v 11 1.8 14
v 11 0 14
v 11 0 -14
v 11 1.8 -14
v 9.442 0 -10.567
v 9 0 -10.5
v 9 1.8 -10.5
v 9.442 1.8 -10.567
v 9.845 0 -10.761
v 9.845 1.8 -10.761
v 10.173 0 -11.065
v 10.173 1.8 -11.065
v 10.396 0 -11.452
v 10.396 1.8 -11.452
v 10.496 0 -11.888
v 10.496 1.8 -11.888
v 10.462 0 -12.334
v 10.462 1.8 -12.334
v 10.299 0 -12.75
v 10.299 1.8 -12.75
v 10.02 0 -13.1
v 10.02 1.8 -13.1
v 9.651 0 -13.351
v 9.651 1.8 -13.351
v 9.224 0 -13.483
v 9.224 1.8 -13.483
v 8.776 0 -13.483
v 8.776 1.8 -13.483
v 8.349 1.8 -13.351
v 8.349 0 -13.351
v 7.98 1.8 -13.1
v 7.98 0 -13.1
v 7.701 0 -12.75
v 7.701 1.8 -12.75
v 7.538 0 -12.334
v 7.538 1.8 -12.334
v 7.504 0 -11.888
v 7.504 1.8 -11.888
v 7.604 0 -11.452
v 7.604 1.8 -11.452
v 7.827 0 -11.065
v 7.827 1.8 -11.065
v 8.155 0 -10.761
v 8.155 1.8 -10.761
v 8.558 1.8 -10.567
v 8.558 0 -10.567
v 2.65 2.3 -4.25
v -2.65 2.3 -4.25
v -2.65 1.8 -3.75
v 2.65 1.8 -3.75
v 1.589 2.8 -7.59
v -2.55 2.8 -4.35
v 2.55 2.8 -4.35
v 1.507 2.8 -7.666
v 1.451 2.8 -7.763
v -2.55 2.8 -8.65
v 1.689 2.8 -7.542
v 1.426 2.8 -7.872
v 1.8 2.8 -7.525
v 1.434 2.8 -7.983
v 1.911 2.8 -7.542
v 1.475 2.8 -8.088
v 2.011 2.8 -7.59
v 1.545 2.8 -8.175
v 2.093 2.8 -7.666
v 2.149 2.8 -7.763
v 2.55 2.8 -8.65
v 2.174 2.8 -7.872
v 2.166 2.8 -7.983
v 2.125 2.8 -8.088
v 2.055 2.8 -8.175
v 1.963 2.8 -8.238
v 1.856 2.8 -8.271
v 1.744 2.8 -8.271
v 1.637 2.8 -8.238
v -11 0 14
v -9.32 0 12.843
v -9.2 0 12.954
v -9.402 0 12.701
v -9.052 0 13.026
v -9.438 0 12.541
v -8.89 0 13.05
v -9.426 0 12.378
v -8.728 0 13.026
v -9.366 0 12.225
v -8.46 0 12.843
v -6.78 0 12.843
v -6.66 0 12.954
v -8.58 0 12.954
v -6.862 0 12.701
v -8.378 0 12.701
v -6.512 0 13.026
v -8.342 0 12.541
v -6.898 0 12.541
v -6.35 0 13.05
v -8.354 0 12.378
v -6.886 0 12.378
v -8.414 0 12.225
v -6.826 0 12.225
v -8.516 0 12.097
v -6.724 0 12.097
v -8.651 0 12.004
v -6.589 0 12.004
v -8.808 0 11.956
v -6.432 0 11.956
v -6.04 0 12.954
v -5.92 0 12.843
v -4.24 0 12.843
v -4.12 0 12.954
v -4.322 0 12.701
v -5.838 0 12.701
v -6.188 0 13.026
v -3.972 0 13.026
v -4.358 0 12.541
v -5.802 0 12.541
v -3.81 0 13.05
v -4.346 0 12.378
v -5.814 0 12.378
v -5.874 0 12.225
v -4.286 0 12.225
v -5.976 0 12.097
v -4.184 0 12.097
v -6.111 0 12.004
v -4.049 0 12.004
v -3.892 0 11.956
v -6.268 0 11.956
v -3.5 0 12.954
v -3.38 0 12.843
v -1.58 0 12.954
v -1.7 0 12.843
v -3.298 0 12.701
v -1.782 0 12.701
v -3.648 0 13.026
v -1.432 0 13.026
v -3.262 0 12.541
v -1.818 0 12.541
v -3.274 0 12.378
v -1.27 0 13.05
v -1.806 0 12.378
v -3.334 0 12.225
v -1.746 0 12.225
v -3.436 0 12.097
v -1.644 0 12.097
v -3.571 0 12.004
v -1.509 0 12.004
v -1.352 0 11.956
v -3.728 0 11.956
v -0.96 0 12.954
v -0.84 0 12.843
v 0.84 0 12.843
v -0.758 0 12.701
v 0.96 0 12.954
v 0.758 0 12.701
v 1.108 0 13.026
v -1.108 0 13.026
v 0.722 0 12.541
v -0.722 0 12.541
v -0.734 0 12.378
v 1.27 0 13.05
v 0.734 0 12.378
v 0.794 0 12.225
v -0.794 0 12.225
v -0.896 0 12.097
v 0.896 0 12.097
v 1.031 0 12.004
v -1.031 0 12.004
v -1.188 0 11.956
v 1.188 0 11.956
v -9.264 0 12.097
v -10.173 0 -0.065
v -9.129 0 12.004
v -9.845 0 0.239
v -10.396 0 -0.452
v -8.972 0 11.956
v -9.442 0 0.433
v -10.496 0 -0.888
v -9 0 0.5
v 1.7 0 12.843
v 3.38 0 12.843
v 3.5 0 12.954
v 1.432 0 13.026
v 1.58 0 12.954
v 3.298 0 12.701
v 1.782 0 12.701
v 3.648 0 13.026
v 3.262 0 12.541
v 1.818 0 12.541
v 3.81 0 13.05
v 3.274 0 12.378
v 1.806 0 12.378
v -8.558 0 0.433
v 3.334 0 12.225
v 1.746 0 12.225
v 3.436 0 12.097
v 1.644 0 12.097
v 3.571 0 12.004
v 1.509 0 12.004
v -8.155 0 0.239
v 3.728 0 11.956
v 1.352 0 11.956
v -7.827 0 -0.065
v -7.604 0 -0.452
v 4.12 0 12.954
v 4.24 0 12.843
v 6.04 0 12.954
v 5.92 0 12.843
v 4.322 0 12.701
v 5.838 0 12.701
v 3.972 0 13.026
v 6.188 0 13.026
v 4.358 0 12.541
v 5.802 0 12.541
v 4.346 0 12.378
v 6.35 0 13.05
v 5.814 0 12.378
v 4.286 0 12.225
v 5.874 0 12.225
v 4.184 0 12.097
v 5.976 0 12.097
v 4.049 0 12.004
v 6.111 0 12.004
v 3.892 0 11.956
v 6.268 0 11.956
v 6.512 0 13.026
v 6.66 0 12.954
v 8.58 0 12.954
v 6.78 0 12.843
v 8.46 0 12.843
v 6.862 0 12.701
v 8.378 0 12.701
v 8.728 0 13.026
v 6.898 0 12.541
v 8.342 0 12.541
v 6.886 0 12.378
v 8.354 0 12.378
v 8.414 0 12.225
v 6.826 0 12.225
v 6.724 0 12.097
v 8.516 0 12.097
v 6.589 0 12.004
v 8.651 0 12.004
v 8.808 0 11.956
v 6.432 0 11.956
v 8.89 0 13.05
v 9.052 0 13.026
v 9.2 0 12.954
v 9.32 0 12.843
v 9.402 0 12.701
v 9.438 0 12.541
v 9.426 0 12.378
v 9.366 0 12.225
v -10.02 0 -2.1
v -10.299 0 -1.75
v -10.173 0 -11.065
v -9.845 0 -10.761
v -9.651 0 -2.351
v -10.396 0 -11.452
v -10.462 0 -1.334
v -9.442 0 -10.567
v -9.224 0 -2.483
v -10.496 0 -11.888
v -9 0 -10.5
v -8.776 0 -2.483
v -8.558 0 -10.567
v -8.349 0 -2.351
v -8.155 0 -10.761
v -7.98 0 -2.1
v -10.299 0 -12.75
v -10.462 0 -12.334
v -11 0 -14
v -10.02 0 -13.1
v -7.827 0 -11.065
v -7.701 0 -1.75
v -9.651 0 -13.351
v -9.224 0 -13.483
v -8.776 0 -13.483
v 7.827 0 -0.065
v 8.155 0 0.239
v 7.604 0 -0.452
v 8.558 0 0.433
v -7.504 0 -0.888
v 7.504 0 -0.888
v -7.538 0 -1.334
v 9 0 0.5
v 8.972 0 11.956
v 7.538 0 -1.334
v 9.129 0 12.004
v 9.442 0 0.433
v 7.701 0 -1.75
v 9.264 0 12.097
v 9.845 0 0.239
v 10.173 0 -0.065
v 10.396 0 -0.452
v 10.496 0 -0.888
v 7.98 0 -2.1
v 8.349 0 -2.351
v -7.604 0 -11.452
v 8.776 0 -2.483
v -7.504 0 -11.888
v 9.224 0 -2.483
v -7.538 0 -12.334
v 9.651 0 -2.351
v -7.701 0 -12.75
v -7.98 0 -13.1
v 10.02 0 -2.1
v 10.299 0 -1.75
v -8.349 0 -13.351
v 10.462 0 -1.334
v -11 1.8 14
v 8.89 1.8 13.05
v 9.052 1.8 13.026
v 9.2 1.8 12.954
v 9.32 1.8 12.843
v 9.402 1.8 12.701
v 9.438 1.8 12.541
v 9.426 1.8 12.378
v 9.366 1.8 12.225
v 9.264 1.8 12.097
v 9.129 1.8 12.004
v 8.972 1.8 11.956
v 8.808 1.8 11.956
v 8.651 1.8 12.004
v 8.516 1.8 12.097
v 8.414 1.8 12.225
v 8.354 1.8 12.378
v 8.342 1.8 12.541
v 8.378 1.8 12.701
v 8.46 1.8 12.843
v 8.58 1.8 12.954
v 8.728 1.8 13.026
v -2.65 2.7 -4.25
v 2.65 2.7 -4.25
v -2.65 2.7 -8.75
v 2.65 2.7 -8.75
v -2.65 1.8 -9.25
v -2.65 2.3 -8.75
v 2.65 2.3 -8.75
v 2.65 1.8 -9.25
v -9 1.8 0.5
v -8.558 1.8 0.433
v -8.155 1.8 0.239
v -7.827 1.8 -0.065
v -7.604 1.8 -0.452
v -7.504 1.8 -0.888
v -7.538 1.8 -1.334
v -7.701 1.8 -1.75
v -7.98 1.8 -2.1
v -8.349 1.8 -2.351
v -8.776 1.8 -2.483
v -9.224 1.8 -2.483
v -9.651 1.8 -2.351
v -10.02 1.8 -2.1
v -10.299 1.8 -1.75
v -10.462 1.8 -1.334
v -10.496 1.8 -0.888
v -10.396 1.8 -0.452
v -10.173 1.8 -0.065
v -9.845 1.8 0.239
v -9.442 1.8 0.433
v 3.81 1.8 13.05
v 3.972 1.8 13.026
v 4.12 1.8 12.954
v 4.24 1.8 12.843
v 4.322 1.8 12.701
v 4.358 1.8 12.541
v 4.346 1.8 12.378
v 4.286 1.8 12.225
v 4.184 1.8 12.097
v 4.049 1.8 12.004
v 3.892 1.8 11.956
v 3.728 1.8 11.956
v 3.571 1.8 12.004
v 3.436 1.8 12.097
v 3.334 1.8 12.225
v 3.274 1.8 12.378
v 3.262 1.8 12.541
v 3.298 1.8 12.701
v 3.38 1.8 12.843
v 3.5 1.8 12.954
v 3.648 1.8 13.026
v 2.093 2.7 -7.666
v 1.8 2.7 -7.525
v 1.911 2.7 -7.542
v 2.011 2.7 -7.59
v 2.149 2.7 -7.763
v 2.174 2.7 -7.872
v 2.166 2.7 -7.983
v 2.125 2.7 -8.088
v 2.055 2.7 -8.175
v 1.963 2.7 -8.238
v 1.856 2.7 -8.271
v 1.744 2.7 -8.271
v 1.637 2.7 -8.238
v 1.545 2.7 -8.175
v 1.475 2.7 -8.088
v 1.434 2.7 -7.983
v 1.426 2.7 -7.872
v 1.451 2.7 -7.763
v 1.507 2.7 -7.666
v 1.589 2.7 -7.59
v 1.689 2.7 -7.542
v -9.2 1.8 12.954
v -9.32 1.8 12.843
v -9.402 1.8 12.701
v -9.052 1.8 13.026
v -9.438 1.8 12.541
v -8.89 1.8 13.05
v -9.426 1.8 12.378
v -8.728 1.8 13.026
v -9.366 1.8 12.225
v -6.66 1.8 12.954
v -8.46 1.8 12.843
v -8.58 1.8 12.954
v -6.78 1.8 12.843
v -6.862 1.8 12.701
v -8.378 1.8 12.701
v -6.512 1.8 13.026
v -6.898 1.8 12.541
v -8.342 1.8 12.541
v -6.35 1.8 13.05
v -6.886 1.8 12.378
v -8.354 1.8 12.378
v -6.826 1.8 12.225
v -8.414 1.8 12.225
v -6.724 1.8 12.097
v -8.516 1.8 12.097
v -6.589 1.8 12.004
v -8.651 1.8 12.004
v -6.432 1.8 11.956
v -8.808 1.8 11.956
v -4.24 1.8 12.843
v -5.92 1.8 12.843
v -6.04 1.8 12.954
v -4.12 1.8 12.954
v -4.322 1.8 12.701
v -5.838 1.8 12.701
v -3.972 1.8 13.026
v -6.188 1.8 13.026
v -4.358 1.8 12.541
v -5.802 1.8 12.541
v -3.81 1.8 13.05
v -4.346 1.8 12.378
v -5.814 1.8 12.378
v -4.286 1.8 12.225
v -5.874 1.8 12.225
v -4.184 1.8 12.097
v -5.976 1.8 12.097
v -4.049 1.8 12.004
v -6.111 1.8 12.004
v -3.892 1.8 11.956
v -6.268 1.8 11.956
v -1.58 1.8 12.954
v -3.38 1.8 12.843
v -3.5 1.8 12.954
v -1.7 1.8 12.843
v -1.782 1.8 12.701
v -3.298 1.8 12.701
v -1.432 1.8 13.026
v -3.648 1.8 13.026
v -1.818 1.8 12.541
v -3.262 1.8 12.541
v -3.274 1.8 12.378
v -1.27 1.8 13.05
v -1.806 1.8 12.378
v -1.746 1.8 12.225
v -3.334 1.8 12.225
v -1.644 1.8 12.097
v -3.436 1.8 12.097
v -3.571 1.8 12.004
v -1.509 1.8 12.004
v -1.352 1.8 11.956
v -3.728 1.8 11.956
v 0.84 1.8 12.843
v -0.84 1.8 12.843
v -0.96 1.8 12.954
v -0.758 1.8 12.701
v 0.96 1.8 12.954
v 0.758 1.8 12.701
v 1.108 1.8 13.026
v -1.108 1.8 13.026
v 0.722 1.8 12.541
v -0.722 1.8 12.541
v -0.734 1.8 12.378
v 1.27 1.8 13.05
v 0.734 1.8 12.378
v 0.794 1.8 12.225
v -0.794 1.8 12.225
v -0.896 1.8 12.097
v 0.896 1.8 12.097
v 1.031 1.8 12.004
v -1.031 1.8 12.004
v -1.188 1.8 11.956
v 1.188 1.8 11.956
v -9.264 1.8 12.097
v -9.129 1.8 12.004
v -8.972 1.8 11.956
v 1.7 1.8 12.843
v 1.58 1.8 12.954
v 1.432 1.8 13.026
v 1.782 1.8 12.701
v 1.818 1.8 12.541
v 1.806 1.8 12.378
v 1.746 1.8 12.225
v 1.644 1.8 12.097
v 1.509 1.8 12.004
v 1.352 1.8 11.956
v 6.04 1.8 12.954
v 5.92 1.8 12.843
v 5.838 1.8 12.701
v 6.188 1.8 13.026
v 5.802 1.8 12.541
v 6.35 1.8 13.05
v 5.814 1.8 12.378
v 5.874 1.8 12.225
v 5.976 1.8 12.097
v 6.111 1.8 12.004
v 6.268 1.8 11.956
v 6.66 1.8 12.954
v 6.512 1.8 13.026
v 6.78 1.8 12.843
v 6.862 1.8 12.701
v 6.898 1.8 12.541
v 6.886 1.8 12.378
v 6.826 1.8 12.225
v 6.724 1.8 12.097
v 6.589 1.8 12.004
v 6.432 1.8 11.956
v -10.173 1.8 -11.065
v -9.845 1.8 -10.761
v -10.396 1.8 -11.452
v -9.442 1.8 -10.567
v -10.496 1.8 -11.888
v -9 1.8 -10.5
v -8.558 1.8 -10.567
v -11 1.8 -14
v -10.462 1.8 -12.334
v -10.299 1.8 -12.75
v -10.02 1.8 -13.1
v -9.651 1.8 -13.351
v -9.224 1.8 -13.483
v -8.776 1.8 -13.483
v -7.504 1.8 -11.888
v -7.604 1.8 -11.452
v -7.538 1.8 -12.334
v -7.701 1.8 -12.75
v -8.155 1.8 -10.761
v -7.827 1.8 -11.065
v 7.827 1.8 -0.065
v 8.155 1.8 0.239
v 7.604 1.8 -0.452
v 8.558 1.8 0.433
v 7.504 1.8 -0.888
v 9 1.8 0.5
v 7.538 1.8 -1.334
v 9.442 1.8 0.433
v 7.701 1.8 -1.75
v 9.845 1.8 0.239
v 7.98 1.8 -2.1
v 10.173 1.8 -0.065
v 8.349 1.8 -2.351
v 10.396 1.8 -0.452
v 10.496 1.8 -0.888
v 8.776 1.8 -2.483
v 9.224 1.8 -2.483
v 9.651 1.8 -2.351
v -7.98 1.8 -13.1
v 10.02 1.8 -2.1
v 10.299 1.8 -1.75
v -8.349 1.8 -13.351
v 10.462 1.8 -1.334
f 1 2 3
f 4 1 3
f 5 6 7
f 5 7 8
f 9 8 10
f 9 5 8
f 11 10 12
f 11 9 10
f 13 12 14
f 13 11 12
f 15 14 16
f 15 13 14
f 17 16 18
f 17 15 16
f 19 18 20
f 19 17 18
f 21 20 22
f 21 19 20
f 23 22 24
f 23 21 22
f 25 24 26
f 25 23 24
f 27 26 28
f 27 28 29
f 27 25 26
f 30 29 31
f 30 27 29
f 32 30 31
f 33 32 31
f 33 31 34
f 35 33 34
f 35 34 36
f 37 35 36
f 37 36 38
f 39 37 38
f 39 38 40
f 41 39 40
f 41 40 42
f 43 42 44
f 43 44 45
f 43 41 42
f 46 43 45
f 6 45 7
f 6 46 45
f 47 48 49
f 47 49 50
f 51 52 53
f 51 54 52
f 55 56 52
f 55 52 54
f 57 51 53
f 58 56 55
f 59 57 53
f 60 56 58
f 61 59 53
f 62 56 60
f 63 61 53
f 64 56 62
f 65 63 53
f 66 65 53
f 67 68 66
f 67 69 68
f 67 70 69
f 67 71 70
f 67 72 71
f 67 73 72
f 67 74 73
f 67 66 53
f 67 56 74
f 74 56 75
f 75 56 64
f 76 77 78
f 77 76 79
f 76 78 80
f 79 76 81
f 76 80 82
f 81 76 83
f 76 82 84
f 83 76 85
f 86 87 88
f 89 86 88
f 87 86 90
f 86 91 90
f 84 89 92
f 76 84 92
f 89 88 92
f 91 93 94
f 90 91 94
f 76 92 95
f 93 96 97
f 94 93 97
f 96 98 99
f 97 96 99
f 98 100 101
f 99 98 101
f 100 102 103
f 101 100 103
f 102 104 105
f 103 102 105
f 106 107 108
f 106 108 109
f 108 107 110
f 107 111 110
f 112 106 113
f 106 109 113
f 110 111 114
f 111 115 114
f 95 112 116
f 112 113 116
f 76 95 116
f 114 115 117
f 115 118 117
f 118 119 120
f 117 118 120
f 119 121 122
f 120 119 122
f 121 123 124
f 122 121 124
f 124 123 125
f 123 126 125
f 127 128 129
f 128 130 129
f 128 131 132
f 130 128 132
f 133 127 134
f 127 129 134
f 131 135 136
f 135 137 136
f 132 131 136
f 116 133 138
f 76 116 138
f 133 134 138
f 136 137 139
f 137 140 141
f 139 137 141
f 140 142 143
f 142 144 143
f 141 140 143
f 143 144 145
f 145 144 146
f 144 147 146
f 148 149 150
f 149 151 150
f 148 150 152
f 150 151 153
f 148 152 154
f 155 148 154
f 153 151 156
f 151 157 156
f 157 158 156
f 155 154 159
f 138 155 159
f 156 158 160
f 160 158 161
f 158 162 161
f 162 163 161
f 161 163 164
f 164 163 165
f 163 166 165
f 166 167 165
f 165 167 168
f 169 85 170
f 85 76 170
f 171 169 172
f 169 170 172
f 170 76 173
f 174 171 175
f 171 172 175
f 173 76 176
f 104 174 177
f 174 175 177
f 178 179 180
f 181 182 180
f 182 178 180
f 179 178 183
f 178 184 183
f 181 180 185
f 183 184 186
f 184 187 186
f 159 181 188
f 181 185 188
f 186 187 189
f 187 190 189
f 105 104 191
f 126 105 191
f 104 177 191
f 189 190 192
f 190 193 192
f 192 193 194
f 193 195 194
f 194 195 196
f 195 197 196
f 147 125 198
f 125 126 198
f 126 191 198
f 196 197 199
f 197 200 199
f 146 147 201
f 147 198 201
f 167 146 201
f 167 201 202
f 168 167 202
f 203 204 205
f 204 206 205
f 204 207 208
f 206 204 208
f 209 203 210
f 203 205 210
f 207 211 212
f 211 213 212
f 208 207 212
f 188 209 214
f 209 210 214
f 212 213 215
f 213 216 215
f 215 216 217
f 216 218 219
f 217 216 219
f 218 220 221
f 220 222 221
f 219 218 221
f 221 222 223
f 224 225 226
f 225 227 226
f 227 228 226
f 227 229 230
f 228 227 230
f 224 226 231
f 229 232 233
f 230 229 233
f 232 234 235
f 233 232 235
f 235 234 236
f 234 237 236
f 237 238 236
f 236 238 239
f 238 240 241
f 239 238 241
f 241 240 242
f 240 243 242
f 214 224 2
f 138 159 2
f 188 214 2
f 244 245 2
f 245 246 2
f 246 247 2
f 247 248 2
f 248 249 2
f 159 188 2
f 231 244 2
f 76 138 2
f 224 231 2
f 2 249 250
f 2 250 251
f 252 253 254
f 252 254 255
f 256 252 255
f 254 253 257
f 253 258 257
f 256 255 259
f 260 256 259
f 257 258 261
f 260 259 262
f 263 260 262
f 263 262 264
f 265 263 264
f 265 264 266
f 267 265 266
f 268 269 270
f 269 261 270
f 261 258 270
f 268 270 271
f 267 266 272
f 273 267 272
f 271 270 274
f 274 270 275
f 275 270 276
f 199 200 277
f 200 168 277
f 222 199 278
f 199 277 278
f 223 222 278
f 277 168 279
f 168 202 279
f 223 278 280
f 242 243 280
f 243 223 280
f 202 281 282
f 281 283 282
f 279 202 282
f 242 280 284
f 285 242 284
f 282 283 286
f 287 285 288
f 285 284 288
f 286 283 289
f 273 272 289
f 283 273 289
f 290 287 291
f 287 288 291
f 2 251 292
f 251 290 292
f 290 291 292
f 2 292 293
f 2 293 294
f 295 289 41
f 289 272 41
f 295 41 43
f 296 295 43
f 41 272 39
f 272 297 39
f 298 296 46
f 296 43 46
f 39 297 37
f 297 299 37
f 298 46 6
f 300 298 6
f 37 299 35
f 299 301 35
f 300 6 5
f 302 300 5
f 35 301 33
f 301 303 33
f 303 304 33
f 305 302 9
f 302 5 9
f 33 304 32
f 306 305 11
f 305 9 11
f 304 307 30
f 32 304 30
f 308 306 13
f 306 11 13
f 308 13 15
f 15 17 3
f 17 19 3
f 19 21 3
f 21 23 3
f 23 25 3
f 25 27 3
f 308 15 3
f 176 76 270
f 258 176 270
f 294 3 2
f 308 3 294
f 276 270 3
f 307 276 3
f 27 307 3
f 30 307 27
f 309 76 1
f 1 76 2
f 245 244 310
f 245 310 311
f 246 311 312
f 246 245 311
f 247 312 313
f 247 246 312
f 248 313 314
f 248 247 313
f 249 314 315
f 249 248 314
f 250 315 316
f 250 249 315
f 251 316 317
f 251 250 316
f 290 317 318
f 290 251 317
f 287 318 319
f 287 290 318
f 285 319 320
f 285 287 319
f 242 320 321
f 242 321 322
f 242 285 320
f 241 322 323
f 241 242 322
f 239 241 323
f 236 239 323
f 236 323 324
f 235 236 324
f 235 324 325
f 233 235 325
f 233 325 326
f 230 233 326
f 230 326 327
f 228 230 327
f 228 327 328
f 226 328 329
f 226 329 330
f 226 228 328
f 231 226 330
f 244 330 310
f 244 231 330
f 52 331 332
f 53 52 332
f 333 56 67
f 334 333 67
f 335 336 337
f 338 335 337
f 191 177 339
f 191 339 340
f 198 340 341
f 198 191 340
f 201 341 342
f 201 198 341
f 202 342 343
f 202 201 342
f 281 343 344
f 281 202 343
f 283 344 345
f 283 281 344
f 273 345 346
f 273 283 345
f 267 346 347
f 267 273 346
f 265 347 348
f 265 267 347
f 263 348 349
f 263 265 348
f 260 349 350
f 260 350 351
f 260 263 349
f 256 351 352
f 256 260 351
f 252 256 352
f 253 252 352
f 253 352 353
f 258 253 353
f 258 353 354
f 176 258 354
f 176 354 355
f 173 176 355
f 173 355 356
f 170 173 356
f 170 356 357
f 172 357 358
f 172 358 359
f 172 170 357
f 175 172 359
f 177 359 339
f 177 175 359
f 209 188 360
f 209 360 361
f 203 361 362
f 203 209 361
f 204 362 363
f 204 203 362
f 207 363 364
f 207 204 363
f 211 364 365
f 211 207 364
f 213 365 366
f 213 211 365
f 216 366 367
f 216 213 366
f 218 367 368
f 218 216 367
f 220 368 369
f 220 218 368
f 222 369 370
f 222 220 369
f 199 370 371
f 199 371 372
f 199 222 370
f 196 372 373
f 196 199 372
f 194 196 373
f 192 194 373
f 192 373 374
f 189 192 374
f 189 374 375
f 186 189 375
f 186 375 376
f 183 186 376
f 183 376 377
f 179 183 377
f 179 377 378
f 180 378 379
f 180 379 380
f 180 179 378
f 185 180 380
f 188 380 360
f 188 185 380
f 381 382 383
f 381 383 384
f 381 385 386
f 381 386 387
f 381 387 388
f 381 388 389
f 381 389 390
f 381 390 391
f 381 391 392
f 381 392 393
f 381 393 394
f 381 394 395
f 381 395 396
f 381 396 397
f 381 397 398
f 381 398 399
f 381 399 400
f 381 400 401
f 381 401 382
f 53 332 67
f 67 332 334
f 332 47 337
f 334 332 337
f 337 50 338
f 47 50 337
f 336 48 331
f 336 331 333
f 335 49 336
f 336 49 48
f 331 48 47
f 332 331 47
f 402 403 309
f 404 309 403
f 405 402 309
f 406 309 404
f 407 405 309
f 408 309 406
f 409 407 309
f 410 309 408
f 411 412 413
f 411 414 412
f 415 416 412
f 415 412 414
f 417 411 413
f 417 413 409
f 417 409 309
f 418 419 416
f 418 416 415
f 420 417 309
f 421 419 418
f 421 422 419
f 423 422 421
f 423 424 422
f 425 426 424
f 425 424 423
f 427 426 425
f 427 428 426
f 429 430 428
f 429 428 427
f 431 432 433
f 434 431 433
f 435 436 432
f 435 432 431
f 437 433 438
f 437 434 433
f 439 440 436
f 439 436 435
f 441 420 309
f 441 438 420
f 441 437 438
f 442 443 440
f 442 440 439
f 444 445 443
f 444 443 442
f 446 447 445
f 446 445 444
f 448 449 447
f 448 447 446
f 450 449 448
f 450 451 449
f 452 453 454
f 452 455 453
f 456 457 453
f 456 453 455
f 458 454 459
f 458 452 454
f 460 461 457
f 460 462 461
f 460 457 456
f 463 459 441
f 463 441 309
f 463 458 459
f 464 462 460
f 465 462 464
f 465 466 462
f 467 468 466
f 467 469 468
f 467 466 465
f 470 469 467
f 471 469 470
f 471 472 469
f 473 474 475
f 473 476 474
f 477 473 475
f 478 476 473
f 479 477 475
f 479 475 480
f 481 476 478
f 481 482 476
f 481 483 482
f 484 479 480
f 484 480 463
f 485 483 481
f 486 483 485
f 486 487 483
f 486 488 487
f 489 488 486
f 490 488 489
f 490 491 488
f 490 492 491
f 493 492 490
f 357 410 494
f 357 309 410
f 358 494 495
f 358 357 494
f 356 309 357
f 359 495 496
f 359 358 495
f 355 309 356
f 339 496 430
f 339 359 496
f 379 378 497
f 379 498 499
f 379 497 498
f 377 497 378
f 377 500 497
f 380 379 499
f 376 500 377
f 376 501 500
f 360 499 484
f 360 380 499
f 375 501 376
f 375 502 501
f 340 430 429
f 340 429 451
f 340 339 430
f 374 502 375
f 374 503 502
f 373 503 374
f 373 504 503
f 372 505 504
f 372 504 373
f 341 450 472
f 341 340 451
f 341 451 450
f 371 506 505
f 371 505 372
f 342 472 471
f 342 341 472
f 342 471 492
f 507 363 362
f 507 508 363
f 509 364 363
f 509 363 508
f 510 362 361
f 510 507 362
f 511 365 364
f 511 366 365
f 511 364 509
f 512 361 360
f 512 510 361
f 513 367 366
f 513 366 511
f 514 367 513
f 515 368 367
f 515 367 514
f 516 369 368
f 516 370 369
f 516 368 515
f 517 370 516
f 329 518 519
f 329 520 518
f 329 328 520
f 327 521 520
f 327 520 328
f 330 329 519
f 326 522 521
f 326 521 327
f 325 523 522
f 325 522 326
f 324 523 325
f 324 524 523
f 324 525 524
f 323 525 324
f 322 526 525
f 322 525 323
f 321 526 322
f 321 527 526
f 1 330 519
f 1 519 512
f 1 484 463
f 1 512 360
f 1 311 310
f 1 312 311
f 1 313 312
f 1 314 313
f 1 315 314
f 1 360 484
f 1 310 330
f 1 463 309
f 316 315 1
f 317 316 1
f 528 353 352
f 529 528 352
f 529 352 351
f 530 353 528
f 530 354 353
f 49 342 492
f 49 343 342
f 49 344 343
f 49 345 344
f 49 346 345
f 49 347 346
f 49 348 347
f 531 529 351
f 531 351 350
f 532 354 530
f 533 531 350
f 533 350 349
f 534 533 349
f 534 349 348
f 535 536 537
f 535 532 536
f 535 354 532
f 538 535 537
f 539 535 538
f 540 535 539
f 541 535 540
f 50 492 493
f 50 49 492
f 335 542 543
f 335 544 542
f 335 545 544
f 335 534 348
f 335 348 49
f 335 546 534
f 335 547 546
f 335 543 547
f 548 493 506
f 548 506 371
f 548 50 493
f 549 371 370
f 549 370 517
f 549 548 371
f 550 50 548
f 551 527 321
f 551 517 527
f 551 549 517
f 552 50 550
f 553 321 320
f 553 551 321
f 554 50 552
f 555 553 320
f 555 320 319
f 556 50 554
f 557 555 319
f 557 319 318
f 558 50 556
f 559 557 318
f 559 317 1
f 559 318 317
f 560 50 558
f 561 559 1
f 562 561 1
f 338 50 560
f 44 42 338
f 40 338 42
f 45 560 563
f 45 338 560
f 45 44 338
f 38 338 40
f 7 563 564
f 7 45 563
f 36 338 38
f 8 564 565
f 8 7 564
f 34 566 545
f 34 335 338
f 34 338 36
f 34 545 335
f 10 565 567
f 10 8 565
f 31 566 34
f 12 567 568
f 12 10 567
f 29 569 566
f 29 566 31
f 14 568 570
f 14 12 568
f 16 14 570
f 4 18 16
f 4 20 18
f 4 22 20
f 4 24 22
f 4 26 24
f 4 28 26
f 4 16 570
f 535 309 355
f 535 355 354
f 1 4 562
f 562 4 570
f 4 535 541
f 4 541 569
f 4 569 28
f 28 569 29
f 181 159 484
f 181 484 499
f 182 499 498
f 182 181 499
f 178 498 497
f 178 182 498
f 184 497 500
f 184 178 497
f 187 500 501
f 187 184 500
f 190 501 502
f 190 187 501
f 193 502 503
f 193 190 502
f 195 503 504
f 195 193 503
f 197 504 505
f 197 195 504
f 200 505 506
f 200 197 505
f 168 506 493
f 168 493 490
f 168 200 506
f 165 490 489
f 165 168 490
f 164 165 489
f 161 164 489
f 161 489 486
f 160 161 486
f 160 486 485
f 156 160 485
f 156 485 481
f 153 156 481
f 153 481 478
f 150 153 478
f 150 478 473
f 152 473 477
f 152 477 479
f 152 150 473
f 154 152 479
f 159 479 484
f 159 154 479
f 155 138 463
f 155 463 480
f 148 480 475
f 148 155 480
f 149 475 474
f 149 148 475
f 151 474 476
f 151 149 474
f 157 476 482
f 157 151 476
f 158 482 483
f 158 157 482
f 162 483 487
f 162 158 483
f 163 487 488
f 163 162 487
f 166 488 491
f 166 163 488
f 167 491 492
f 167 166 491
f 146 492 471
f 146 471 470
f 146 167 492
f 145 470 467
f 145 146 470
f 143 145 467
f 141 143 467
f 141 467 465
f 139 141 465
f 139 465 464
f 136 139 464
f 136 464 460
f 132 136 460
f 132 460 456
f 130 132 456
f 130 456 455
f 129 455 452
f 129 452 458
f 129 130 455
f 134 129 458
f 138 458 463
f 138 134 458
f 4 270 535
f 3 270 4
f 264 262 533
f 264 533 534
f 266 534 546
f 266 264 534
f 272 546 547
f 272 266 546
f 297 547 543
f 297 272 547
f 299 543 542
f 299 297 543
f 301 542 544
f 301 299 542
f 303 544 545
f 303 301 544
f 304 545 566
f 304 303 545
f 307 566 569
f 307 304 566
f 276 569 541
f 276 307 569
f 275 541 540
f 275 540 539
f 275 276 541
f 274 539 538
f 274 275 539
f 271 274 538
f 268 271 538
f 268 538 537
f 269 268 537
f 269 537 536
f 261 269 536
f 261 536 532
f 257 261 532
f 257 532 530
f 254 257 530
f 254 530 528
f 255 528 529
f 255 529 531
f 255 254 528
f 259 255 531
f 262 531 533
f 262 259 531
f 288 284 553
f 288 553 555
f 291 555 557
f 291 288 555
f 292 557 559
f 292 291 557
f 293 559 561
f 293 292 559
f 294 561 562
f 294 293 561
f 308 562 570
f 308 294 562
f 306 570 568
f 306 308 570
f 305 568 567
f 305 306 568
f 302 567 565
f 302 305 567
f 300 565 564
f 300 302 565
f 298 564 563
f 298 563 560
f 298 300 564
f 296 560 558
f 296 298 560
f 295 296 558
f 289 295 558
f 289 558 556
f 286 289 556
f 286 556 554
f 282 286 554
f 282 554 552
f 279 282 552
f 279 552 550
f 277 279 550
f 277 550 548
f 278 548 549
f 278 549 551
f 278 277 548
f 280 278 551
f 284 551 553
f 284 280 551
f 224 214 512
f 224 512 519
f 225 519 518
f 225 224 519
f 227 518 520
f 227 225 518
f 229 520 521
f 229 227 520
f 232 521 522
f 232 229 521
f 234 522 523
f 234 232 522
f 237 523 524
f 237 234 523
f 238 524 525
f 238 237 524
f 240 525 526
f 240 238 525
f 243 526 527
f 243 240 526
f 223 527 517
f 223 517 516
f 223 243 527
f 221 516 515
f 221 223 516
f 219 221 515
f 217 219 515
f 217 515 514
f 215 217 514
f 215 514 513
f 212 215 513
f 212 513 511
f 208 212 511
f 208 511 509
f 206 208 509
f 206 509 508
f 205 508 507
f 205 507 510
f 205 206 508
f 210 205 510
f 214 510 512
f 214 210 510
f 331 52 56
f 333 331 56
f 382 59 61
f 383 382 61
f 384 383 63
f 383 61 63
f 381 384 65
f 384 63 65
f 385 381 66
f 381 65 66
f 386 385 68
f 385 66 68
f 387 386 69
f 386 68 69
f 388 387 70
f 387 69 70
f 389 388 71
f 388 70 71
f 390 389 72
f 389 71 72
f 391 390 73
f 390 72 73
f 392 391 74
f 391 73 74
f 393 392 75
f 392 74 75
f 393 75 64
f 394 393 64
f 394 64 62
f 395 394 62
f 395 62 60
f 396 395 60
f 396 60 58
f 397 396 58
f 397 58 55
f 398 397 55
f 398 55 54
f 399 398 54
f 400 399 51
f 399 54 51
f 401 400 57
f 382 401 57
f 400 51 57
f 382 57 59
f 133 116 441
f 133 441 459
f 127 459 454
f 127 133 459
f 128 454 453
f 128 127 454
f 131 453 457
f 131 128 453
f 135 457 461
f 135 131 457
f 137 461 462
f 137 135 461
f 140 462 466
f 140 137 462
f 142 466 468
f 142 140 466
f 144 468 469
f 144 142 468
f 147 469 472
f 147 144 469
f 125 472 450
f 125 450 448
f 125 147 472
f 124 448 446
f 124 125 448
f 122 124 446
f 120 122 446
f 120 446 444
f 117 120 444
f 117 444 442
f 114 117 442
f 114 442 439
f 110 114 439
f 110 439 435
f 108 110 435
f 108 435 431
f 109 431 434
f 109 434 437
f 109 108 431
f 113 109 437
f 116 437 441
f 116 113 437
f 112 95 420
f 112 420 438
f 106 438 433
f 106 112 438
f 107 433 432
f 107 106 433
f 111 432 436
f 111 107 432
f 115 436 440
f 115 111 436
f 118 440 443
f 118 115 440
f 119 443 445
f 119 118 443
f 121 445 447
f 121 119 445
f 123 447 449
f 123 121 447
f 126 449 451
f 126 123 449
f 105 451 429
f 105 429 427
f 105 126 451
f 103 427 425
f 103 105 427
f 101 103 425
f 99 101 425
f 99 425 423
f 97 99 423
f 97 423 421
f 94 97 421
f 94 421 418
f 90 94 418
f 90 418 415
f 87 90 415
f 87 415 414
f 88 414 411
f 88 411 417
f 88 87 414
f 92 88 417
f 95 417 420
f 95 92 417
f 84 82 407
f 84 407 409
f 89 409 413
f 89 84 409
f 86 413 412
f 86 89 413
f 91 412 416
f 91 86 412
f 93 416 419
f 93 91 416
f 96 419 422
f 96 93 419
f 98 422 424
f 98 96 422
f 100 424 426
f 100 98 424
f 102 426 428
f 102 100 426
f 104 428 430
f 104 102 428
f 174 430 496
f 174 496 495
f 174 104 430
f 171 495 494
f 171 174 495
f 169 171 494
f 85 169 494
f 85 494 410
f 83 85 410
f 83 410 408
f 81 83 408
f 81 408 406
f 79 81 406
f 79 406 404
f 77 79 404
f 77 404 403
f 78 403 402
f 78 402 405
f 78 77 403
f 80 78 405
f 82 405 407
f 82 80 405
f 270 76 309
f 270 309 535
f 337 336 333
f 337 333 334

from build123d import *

# Parameters (mm, degrees)
SKETCH1_W           = 22
SKETCH1_H           = 28
SKETCH1_R           = 1.5
SKETCH1_R_2         = 0.55
BOSS_EXTRUDE1_DEPTH = 1.8
SKETCH2_W           = 5.3
SKETCH2_H           = 4.5
BOSS_EXTRUDE2_DEPTH = 1
CHAMFER1_SIZE       = 0.5
CHAMFER2_SIZE       = 0.1
SKETCH3_R           = 0.375
CUT_EXTRUDE1_DEPTH  = 0.1


with BuildPart() as part:
    # Sketch1 → Boss-Extrude1 (new body)
    with BuildSketch(Plane(origin=(0, 0, 0), x_dir=(1, 0, 0), z_dir=(0, 1, 0))):
        Rectangle(SKETCH1_W, SKETCH1_H)
        with Locations(Location((-9, 12, 0), (0, 0, 270))):
            Circle(SKETCH1_R, mode=Mode.SUBTRACT)
        with Locations(Location((9, 12, 0), (0, 0, 270))):
            Circle(SKETCH1_R, mode=Mode.SUBTRACT)
        with Locations(Location((9, 1, 0), (0, 0, 270))):
            Circle(SKETCH1_R, mode=Mode.SUBTRACT)
        with Locations(Location((-9, 1, 0), (0, 0, 270))):
            Circle(SKETCH1_R, mode=Mode.SUBTRACT)
        with Locations(Location((-8.89, -12.5, 0), (0, 0, 270))):
            Circle(SKETCH1_R_2, mode=Mode.SUBTRACT)
        with Locations(Location((-6.35, -12.5, 0), (0, 0, 270))):
            Circle(SKETCH1_R_2, mode=Mode.SUBTRACT)
        with Locations(Location((-3.81, -12.5, 0), (0, 0, 270))):
            Circle(SKETCH1_R_2, mode=Mode.SUBTRACT)
        with Locations(Location((-1.27, -12.5, 0), (0, 0, 270))):
            Circle(SKETCH1_R_2, mode=Mode.SUBTRACT)
        with Locations(Location((1.27, -12.5, 0), (0, 0, 270))):
            Circle(SKETCH1_R_2, mode=Mode.SUBTRACT)
        with Locations(Location((3.81, -12.5, 0), (0, 0, 270))):
            Circle(SKETCH1_R_2, mode=Mode.SUBTRACT)
        with Locations(Location((6.35, -12.5, 0), (0, 0, 270))):
            Circle(SKETCH1_R_2, mode=Mode.SUBTRACT)
        with Locations(Location((8.89, -12.5, 0), (0, 0, 270))):
            Circle(SKETCH1_R_2, mode=Mode.SUBTRACT)
    extrude(amount=BOSS_EXTRUDE1_DEPTH)

    # Sketch2 → Boss-Extrude2 (add)
    with BuildSketch(Plane(origin=(0, 1.8, 0), x_dir=(1, 0, 0), z_dir=(0, 1, 0))):
        with Locations((0, 6.5)):
            Rectangle(SKETCH2_W, SKETCH2_H)
    extrude(amount=BOSS_EXTRUDE2_DEPTH)

    # Chamfer1
    chamfer1_edges = [part.edges().sort_by_distance(p)[0] for p in [
        (0, 1.8, -8.75),
        (0, 1.8, -4.25),
    ]]
    chamfer(chamfer1_edges, length=CHAMFER1_SIZE)

    # Chamfer2
    chamfer2_edges = [part.edges().sort_by_distance(p)[0] for p in [
        (2.65, 2.8, -6.5),
        (0, 2.8, -8.75),
        (-2.65, 2.8, -6.5),
        (0, 2.8, -4.25),
    ]]
    chamfer(chamfer2_edges, length=CHAMFER2_SIZE)

    # Sketch3 → Cut-Extrude1 (cut)
    with BuildSketch(Plane(origin=(0, 2.8, 0), x_dir=(1, 0, 0), z_dir=(0, 1, 0))):
        with Locations(Location((1.8, 7.9, 0), (0, 0, 270))):
            Circle(SKETCH3_R)
    extrude(amount=-CUT_EXTRUDE1_DEPTH, mode=Mode.SUBTRACT)


solid = part.part
